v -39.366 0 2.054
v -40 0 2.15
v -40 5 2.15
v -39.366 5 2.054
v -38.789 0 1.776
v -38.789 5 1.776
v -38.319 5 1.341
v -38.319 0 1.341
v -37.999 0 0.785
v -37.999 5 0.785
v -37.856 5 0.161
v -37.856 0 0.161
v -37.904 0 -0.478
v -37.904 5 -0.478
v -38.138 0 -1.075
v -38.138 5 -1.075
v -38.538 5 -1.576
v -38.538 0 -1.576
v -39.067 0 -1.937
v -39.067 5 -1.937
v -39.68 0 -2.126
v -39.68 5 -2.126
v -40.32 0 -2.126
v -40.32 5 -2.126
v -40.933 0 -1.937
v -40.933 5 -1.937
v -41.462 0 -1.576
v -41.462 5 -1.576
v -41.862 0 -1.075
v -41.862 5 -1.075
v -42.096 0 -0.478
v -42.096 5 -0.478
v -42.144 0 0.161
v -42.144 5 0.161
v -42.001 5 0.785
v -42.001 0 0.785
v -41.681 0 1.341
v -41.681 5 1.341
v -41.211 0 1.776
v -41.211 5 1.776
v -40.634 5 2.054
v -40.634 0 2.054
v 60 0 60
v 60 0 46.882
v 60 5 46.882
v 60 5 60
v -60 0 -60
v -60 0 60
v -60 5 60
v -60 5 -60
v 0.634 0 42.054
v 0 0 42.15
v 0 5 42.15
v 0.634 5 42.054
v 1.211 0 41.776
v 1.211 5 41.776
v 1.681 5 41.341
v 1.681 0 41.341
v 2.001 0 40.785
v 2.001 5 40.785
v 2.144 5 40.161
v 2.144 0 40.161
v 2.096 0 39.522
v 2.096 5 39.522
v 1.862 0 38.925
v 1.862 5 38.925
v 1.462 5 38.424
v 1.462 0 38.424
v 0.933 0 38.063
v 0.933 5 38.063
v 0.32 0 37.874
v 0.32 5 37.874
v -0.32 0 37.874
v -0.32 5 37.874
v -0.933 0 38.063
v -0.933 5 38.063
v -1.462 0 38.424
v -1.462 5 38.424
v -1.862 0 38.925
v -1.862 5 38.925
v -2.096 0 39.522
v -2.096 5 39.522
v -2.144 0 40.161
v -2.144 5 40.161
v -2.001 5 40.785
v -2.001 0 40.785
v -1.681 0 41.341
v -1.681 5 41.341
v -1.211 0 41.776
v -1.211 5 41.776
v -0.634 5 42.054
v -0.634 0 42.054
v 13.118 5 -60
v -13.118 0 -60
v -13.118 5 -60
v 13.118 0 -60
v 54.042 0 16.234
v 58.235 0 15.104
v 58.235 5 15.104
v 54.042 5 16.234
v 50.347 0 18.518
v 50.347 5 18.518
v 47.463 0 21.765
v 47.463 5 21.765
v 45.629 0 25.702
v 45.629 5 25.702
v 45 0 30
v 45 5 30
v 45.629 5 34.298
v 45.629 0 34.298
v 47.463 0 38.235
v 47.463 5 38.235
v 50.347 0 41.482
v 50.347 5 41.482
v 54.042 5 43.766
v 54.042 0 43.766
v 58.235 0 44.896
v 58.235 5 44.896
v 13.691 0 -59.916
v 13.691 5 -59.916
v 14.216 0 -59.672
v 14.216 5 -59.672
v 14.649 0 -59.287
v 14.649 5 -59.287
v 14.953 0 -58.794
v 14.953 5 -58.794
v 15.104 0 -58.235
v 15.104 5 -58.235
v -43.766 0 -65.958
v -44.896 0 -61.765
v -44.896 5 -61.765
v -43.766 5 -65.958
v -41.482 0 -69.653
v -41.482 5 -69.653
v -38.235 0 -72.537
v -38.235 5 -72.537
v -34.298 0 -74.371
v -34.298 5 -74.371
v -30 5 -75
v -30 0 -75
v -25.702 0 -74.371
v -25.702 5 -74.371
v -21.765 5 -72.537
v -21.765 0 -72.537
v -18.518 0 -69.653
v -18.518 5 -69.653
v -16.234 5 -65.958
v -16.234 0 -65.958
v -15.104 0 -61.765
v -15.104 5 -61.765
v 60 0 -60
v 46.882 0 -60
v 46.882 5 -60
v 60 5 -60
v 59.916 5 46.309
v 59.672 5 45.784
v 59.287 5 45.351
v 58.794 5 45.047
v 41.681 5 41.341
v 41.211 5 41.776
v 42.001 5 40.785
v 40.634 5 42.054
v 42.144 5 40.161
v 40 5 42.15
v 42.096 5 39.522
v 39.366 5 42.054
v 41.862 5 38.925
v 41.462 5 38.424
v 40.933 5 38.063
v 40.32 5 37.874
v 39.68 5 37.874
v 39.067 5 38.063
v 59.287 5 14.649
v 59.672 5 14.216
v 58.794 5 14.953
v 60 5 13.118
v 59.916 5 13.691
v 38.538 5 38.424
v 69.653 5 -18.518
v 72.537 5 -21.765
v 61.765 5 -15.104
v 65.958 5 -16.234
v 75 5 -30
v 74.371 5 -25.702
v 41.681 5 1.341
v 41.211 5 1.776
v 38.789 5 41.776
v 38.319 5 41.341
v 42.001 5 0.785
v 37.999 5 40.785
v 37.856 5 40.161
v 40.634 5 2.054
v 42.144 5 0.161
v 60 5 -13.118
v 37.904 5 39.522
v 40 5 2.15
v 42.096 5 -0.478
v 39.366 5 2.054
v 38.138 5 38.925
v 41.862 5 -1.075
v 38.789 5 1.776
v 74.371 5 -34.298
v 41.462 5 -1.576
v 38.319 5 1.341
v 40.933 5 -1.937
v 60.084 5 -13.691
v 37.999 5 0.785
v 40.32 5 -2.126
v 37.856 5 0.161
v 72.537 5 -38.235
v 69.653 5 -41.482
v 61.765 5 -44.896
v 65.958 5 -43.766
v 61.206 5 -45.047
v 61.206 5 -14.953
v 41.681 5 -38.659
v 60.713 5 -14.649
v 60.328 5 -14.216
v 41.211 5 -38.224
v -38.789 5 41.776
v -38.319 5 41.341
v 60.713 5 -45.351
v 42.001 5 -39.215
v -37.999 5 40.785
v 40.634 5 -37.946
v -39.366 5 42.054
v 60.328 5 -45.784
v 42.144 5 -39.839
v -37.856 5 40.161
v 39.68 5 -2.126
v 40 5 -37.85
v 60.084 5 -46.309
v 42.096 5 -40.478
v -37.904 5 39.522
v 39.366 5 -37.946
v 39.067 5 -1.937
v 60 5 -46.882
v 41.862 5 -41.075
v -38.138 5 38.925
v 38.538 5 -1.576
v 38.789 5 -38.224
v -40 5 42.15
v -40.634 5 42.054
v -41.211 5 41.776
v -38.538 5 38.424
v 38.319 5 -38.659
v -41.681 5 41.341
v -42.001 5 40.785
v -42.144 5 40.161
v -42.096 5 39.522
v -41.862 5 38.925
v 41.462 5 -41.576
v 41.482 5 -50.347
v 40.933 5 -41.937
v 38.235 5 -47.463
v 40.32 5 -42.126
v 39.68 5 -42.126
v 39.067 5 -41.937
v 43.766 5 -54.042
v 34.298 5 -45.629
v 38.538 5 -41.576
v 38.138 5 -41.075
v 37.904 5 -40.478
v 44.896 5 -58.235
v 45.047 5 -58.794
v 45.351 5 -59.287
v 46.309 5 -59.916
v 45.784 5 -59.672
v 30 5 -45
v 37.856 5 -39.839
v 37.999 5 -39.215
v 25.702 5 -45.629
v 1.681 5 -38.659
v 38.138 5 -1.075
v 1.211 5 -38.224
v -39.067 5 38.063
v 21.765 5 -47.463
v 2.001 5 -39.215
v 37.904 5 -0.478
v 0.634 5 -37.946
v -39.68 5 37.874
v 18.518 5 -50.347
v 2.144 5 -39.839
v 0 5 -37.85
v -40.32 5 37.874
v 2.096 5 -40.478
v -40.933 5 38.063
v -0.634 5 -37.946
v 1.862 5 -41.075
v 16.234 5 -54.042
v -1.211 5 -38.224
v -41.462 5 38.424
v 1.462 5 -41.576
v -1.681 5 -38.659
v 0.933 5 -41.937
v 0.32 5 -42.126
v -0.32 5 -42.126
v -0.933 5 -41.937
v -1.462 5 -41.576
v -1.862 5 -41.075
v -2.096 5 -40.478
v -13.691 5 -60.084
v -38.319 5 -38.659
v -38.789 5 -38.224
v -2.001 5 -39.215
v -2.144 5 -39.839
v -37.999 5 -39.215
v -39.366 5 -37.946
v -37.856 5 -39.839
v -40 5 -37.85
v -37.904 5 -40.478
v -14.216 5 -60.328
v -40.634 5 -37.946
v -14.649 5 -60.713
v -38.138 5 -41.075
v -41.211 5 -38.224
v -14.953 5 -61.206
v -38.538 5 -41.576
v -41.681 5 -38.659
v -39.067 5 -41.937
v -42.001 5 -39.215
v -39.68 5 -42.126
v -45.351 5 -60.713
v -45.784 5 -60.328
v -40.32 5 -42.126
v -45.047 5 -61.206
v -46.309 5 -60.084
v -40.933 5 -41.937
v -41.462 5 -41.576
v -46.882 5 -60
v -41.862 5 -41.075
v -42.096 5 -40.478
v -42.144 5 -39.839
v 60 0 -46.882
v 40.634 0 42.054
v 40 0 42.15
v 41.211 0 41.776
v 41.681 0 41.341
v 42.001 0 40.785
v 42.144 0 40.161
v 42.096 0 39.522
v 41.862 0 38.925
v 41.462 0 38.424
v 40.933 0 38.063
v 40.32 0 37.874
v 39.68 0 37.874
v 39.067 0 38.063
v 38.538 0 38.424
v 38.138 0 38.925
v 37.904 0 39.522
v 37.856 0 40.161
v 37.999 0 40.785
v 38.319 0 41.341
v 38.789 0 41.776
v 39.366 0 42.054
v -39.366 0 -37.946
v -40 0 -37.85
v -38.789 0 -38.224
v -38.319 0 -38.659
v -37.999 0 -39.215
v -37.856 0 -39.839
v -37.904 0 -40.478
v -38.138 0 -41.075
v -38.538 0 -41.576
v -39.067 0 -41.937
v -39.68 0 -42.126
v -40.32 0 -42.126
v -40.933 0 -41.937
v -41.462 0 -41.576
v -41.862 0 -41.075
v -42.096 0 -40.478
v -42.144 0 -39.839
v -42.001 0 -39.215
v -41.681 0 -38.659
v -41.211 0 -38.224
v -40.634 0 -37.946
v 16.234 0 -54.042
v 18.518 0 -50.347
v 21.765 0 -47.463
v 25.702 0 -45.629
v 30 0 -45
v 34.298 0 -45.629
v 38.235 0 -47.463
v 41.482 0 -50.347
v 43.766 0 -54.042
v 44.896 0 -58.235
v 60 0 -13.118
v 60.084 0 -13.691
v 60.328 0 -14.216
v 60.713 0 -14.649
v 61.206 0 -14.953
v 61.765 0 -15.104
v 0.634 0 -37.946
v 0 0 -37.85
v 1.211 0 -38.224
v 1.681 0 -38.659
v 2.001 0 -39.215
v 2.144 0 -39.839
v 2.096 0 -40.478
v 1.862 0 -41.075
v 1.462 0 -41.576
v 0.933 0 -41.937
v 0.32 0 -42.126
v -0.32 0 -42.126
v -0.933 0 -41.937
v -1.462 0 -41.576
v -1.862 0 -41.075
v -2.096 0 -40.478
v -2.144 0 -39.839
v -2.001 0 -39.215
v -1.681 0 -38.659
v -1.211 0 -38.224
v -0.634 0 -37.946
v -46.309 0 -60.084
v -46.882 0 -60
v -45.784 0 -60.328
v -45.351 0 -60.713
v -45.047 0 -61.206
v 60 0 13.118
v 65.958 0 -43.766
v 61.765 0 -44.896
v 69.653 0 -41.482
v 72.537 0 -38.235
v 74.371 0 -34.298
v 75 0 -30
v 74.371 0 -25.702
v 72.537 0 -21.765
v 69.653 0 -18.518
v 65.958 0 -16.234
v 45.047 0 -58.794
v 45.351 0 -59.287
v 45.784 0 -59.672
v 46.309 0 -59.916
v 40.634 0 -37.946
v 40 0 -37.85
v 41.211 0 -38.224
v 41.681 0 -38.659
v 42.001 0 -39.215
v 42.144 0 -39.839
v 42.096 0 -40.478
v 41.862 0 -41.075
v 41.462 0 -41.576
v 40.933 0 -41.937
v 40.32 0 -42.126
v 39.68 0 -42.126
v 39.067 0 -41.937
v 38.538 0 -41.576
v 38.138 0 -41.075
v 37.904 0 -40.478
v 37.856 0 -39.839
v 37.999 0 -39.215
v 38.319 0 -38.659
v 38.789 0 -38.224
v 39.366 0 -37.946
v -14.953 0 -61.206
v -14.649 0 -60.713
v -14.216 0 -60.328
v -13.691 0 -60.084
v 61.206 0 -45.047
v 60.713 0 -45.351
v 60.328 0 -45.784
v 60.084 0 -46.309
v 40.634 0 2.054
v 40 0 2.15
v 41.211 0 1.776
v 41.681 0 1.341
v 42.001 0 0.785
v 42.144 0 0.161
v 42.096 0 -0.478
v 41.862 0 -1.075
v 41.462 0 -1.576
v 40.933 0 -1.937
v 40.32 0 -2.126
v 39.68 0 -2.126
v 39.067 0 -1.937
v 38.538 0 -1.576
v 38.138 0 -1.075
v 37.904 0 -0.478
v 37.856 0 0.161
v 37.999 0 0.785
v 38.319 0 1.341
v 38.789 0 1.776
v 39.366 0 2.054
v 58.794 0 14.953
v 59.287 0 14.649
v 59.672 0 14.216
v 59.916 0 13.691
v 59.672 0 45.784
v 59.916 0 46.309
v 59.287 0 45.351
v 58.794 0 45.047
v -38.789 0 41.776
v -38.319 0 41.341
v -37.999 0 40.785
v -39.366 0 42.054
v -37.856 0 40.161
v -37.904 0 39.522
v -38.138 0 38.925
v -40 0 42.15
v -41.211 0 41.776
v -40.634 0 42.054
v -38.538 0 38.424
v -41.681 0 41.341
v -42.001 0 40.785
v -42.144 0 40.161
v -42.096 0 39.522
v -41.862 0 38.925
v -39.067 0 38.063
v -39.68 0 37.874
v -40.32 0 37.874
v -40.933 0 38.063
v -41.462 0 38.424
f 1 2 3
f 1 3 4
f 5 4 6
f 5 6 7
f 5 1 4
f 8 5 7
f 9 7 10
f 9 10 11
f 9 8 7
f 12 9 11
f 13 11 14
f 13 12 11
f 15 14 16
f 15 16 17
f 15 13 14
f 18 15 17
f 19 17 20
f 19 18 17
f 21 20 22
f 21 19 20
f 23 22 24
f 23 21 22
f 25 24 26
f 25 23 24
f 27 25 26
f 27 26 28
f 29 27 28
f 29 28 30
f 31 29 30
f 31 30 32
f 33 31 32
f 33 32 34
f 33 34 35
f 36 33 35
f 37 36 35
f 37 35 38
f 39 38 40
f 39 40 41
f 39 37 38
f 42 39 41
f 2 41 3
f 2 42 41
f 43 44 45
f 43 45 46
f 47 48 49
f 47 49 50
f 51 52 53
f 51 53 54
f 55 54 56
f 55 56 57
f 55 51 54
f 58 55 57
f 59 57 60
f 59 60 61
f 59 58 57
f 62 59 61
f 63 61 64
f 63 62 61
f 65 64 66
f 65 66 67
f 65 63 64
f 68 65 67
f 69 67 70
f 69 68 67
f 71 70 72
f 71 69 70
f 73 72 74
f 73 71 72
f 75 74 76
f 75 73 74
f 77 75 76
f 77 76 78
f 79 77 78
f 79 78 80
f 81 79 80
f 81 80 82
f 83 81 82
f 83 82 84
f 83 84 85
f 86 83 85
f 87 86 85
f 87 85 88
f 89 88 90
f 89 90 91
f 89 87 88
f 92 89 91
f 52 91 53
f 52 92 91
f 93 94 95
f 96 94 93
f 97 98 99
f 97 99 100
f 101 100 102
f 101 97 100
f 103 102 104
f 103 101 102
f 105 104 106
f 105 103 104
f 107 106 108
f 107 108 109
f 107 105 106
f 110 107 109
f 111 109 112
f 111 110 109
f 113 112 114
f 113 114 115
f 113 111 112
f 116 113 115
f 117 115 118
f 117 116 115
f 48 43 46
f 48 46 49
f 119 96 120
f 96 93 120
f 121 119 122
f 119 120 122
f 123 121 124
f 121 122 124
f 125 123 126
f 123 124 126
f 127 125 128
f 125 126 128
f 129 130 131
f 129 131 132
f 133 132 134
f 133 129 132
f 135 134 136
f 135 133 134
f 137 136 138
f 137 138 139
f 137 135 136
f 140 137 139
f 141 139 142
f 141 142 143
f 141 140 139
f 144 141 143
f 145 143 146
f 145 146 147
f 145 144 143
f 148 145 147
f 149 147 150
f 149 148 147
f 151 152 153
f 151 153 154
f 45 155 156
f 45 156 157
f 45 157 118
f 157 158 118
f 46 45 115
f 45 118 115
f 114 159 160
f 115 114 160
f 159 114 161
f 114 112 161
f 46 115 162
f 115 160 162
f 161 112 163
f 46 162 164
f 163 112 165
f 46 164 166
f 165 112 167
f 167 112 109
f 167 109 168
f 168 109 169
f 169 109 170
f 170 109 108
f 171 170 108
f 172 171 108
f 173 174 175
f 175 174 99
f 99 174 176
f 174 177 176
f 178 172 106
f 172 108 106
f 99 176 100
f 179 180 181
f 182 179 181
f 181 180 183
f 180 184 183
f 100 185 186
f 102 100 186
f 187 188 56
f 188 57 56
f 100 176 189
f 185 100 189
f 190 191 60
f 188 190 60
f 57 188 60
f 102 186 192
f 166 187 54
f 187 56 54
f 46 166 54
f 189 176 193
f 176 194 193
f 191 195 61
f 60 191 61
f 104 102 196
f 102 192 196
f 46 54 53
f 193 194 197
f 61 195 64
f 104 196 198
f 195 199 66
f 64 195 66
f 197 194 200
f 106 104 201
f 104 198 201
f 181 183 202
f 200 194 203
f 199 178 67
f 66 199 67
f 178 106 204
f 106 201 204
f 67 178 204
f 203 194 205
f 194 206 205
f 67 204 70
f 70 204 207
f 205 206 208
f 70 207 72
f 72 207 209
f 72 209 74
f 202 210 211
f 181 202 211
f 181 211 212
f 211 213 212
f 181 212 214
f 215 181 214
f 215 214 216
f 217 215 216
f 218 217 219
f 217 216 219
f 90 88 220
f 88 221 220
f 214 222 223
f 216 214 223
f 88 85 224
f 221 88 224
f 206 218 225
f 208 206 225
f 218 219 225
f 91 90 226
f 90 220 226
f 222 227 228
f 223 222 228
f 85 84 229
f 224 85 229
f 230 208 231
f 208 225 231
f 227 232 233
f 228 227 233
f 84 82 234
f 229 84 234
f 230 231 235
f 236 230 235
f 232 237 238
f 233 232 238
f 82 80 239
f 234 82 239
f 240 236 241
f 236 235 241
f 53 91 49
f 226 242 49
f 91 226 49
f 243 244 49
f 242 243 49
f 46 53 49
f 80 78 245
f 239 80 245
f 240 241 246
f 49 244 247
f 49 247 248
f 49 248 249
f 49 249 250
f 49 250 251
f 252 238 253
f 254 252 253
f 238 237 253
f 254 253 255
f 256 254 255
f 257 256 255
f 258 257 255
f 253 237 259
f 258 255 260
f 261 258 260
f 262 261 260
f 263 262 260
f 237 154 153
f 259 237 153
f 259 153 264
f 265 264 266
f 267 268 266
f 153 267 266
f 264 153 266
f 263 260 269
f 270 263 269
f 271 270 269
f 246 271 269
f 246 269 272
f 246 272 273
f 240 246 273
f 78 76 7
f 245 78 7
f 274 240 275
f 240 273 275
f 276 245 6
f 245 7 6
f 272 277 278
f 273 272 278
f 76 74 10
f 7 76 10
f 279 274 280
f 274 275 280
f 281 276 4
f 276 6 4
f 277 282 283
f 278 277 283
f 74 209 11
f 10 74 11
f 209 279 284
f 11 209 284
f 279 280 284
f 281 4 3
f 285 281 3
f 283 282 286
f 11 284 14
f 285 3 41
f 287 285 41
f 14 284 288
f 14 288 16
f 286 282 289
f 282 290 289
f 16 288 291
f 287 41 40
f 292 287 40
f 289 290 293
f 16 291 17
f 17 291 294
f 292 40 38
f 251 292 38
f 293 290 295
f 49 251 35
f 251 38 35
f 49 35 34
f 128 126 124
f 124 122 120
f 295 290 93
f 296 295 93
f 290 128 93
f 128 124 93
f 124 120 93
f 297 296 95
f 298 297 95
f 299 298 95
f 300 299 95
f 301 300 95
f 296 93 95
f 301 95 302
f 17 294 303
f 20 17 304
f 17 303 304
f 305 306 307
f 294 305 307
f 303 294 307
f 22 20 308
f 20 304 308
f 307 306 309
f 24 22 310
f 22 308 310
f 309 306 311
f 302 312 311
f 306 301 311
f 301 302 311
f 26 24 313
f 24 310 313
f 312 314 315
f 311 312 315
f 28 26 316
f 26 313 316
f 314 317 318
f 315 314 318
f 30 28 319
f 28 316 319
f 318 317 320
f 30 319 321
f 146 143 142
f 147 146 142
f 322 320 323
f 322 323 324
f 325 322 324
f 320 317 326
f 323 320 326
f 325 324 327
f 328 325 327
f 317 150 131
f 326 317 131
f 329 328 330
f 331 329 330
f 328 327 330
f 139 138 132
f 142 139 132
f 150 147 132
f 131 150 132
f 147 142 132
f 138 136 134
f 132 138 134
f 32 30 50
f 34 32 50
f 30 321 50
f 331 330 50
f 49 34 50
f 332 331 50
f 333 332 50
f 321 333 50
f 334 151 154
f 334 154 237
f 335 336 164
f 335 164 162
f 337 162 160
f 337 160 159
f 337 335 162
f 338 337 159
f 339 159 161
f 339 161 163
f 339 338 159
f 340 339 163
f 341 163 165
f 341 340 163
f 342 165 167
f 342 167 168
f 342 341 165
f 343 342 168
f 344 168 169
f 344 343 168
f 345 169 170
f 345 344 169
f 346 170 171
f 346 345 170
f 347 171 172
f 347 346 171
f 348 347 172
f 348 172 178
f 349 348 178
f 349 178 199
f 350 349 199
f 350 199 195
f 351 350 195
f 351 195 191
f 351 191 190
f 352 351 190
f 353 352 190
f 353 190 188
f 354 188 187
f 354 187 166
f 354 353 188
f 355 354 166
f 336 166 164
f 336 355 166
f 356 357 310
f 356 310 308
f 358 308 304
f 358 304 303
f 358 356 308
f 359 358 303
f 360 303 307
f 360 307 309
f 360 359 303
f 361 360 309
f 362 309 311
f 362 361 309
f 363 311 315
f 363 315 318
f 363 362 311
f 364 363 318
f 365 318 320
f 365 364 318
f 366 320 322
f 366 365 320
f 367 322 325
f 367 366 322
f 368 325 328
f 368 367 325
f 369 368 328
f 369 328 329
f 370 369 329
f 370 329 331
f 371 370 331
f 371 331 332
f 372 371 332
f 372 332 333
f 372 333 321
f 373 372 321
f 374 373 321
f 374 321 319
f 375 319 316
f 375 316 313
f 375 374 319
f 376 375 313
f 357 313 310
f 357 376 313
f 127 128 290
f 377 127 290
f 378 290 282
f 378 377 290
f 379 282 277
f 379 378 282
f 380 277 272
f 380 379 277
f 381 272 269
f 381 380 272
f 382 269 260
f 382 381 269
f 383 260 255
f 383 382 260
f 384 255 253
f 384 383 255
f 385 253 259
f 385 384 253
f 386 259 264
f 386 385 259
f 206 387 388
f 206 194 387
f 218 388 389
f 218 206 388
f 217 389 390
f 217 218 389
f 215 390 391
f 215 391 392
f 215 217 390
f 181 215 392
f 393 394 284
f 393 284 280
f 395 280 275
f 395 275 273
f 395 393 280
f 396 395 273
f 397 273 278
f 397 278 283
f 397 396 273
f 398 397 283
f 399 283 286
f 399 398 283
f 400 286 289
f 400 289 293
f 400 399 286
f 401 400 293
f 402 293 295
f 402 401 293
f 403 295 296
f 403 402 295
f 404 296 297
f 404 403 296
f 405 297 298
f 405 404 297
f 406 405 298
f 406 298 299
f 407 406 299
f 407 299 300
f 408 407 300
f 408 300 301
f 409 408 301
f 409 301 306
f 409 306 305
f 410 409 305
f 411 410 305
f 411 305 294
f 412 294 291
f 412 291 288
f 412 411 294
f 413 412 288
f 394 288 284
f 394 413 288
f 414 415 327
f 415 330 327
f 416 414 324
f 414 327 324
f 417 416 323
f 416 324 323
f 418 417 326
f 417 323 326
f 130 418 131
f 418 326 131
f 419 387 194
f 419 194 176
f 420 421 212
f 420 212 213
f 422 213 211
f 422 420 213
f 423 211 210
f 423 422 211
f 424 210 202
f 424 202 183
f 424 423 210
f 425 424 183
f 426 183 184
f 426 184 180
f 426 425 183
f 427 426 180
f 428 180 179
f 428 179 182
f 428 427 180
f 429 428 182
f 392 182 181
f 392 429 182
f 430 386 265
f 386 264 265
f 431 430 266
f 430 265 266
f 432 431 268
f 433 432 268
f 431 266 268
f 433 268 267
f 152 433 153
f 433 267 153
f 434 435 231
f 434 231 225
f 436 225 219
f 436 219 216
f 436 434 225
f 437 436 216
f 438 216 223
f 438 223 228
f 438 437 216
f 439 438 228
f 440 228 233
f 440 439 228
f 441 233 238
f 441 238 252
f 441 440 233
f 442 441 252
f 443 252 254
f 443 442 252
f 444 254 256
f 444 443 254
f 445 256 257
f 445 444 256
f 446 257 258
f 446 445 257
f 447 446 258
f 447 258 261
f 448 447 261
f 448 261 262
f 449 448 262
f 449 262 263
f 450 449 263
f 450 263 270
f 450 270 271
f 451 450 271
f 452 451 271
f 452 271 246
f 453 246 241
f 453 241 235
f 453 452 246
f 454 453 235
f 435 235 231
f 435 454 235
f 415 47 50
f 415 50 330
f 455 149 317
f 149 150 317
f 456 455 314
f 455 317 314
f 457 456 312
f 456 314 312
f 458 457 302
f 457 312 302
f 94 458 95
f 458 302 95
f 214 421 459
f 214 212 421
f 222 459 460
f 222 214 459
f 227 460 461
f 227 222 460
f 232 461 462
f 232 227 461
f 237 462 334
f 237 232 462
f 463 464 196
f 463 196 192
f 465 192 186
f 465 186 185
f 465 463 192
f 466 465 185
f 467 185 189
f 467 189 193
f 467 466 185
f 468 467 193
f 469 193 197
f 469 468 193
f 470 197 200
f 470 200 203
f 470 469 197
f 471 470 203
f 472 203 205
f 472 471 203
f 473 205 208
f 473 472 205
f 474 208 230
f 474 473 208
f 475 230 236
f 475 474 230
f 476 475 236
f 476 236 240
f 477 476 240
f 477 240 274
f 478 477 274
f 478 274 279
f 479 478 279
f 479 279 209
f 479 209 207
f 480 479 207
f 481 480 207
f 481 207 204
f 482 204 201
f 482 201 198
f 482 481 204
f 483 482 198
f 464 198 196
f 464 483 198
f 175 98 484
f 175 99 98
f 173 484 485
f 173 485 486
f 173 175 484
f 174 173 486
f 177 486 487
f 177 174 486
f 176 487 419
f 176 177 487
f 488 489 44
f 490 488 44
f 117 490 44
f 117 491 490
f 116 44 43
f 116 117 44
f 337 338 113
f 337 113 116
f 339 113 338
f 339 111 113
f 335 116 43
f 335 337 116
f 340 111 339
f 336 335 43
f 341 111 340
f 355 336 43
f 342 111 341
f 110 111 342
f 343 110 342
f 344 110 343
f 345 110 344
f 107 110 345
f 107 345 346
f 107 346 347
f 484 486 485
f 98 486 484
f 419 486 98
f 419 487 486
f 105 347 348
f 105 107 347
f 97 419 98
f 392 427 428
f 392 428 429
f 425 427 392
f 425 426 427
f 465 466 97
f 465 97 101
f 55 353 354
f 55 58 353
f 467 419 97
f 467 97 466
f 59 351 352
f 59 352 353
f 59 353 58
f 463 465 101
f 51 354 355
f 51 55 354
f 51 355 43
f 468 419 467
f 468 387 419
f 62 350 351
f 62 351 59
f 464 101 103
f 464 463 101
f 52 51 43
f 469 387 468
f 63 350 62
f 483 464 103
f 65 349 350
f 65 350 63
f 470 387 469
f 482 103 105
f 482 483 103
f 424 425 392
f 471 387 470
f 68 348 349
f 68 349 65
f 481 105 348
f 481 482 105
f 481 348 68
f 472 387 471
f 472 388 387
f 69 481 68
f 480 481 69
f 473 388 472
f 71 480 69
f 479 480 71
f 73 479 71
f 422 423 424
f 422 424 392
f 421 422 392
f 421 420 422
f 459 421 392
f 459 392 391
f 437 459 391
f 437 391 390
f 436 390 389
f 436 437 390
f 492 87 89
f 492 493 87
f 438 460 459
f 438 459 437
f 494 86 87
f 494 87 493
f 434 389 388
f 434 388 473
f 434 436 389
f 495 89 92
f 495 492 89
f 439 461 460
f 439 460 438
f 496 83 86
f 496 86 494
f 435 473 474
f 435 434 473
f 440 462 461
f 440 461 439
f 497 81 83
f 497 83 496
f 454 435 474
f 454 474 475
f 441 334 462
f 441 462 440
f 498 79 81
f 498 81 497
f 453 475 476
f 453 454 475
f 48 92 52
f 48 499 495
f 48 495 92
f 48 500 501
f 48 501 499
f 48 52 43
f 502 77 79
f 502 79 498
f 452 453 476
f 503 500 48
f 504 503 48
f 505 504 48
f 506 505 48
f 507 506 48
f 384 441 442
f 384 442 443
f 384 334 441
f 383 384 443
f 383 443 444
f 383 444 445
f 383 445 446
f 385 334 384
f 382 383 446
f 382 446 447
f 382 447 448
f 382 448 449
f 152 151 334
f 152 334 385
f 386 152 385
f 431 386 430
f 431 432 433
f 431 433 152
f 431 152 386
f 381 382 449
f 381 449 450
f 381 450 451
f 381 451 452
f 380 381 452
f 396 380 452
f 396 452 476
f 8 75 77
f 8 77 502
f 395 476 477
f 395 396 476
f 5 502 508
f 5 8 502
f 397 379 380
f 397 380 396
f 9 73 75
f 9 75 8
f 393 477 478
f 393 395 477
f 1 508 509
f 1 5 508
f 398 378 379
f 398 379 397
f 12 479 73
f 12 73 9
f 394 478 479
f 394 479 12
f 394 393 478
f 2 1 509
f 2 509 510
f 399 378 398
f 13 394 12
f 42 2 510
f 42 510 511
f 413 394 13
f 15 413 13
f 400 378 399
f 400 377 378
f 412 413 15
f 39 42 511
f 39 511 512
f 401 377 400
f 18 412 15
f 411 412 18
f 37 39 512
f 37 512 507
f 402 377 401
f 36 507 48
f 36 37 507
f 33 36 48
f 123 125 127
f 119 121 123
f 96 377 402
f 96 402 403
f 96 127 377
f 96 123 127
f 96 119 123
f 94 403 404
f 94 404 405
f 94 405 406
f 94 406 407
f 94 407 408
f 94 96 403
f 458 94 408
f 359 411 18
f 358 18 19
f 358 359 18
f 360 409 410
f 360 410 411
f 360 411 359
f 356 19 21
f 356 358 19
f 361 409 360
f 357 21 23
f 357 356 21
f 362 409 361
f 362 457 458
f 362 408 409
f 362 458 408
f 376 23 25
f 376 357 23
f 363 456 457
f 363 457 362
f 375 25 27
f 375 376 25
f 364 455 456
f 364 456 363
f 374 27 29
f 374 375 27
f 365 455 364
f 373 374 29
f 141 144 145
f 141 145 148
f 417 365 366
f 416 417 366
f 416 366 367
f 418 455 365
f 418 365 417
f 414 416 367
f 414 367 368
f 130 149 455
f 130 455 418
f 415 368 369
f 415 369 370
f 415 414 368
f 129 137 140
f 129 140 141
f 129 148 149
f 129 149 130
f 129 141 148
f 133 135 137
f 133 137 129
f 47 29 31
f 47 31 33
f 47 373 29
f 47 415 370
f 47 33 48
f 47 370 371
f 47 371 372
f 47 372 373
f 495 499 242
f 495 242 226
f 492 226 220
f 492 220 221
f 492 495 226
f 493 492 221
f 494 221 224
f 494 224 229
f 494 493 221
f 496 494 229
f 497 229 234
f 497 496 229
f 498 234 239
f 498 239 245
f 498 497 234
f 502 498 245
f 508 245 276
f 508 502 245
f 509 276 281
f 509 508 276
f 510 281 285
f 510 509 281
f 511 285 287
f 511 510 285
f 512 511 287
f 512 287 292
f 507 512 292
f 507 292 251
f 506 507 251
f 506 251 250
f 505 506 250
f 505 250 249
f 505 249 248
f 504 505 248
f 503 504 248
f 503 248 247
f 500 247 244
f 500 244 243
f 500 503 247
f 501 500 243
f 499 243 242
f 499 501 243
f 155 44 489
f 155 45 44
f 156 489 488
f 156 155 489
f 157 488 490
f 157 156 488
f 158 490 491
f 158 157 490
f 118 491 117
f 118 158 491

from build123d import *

# Parameters (mm, degrees)
SKETCH1_R           = 2.15
BOSS_EXTRUDE1_DEPTH = 5
FILLET1_R           = 2


with BuildPart() as part:
    # Sketch1 → Boss-Extrude1 (new body)
    with BuildSketch(Plane(origin=(0, 0, 0), x_dir=(1, 0, 0), z_dir=(0, 1, 0))):
        with BuildLine():
            Line((60, -60), (-60, -60))
            Line((-60, -60), (-60, 60))
            Line((-60, 60), (-45, 60))
            ThreePointArc((-45, 60), (-30, 75), (-15, 60))
            Line((-15, 60), (15, 60))
            ThreePointArc((15, 60), (30, 45), (45, 60))
            Line((45, 60), (60, 60))
            Line((60, 60), (60, 45))
            ThreePointArc((60, 45), (75, 30), (60, 15))
            Line((60, 15), (60, -15))
            ThreePointArc((60, -15), (45, -30), (60, -45))
            Line((60, -45), (60, -60))
        make_face()
        with Locations((-40, -40)):
            Circle(SKETCH1_R, mode=Mode.SUBTRACT)
        with Locations((40, 40)):
            Circle(SKETCH1_R, mode=Mode.SUBTRACT)
        with Locations((-40, 40)):
            Circle(SKETCH1_R, mode=Mode.SUBTRACT)
        with Locations((0, 40)):
            Circle(SKETCH1_R, mode=Mode.SUBTRACT)
        with Locations((-40, 0)):
            Circle(SKETCH1_R, mode=Mode.SUBTRACT)
        with Locations((40, -40)):
            Circle(SKETCH1_R, mode=Mode.SUBTRACT)
        with Locations((40, 0)):
            Circle(SKETCH1_R, mode=Mode.SUBTRACT)
        with Locations((0, -40)):
            Circle(SKETCH1_R, mode=Mode.SUBTRACT)
    extrude(amount=BOSS_EXTRUDE1_DEPTH)

    # Fillet1
    fillet1_edges = [part.edges().sort_by_distance(p)[0] for p in [
        (-45, 2.5, -60),
        (-15, 2.5, -60),
        (15, 2.5, -60),
        (45, 2.5, -60),
        (60, 2.5, -45),
        (60, 2.5, -15),
        (60, 2.5, 15),
        (60, 2.5, 45),
    ]]
    fillet(fillet1_edges, radius=FILLET1_R)


solid = part.part
